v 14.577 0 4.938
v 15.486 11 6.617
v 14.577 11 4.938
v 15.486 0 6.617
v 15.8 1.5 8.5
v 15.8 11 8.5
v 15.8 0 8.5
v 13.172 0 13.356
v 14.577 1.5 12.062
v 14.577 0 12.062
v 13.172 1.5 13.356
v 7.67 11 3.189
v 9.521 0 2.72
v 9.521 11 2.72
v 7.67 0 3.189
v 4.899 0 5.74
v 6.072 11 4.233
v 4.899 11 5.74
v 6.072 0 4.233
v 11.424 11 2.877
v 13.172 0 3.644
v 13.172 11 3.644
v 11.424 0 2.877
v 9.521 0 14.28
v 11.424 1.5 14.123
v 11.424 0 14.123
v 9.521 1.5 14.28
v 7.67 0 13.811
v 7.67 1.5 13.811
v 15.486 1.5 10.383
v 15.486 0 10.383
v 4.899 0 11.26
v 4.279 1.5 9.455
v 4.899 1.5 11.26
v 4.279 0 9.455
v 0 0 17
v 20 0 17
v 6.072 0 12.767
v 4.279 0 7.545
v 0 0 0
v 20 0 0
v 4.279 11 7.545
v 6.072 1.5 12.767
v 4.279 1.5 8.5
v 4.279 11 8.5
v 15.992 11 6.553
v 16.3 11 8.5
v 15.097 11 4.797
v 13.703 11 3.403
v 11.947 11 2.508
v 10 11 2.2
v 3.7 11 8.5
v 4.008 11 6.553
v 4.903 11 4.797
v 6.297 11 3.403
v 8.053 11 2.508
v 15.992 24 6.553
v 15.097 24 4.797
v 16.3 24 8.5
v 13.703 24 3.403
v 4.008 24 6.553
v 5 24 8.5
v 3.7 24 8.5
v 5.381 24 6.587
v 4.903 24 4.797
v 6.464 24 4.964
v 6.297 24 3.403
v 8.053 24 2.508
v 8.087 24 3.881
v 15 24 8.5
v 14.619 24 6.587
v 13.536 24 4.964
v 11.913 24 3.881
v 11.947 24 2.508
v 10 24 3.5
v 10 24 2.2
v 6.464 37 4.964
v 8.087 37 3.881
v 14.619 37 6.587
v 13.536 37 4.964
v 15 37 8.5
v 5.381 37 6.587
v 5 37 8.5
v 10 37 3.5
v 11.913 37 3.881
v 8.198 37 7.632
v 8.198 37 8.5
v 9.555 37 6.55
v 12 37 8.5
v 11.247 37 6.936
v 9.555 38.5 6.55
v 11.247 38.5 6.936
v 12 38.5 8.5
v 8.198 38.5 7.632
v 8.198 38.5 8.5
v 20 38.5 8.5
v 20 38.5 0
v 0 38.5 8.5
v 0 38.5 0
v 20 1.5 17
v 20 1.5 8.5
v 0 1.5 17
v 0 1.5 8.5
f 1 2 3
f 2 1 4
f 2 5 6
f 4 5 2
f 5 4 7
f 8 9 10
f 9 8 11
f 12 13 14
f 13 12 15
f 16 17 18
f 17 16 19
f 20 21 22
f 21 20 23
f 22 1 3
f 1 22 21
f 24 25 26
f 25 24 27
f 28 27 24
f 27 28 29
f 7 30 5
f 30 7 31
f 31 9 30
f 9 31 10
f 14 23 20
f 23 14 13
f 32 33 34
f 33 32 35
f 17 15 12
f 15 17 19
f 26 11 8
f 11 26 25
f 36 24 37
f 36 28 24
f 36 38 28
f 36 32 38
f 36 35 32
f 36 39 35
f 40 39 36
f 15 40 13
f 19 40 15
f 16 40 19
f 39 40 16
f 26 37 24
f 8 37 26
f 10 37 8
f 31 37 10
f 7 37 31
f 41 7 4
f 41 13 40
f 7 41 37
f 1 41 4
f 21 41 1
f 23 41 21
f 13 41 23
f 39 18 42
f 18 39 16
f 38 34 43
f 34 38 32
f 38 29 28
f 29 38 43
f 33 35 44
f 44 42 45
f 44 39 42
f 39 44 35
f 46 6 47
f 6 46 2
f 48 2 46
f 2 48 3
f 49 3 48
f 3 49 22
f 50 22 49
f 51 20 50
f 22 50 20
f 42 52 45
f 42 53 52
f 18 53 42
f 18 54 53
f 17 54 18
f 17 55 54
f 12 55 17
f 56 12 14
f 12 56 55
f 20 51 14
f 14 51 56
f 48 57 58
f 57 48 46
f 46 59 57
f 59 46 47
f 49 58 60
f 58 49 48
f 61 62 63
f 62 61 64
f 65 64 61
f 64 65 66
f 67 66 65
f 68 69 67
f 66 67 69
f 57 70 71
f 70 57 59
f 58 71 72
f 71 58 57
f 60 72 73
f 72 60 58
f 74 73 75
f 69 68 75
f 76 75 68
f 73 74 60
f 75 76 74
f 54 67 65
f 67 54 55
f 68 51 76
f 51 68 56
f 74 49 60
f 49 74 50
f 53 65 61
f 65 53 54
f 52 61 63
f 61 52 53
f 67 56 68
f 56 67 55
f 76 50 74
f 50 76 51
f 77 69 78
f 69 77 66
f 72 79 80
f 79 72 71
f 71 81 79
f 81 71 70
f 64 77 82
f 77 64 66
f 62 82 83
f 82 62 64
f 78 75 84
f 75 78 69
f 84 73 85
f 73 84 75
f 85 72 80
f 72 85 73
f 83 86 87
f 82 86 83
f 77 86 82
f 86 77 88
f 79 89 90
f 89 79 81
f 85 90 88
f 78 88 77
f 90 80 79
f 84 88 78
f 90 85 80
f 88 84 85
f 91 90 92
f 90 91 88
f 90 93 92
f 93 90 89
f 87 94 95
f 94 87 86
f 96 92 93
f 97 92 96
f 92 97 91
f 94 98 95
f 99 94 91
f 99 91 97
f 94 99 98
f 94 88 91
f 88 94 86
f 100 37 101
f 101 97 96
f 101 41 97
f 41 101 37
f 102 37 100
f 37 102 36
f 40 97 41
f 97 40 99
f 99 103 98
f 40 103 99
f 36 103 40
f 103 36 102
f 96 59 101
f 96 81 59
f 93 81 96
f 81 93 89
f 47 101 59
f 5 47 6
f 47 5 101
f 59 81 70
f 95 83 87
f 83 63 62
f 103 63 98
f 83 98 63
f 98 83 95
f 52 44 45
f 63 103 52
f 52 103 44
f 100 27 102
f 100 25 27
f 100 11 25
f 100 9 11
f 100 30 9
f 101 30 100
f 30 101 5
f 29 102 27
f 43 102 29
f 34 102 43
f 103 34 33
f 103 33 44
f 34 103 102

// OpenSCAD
bottomThickness = 1.5;
wallThickness = bottomThickness;

width = 20;
height = 17;
depth = 38.5;

powerSocketHolder();

module powerSocketHolder(width = 20, height = 17) {
    socketOuterRadius = 5.8;
    depth = 38.5;

    difference() {
        difference() {
            cube([width, depth, height]);
            
            translate([width / 2, 0, height / 2])
            union() {
                rotate([-90, 0, 0])
                cylinder(r=socketOuterRadius, 11);

                translate([0, 11, 0])
                rotate([-90, 0, 0])
                cylinder(r=socketOuterRadius + .5, 13);
                
                translate([0, 24, 0])
                rotate([-90, 0, 0])
                cylinder(r=5, 13);
                
                translate([0, 37, 0])
                rotate([-90, 0, 0])
                cylinder(r=2, wallThickness);
            }
        }
        translate([0, wallThickness, height / 2])
        cube([width, depth, height]);
    }
}














// LIB


module boxWithRoundedCorners(width, depth, height, cornerRadius) {
    innerWidth = width - cornerRadius * 2;
    innerDepth = depth - cornerRadius * 2;
    
    translate([cornerRadius, 0, 0])
    cube([innerWidth, depth, height]);
    translate([0, cornerRadius, 0])
    cube([width, innerDepth, height]);
    
    translate([cornerRadius, cornerRadius, 0])
    cylinder(h=height, r=cornerRadius);
    translate([width - cornerRadius, cornerRadius, 0])
    cylinder(h=height, r=cornerRadius);
    translate([width - cornerRadius, depth - cornerRadius, 0])
    cylinder(h=height, r=cornerRadius);
    translate([cornerRadius, depth - cornerRadius, 0])
    cylinder(h=height, r=cornerRadius);
}
